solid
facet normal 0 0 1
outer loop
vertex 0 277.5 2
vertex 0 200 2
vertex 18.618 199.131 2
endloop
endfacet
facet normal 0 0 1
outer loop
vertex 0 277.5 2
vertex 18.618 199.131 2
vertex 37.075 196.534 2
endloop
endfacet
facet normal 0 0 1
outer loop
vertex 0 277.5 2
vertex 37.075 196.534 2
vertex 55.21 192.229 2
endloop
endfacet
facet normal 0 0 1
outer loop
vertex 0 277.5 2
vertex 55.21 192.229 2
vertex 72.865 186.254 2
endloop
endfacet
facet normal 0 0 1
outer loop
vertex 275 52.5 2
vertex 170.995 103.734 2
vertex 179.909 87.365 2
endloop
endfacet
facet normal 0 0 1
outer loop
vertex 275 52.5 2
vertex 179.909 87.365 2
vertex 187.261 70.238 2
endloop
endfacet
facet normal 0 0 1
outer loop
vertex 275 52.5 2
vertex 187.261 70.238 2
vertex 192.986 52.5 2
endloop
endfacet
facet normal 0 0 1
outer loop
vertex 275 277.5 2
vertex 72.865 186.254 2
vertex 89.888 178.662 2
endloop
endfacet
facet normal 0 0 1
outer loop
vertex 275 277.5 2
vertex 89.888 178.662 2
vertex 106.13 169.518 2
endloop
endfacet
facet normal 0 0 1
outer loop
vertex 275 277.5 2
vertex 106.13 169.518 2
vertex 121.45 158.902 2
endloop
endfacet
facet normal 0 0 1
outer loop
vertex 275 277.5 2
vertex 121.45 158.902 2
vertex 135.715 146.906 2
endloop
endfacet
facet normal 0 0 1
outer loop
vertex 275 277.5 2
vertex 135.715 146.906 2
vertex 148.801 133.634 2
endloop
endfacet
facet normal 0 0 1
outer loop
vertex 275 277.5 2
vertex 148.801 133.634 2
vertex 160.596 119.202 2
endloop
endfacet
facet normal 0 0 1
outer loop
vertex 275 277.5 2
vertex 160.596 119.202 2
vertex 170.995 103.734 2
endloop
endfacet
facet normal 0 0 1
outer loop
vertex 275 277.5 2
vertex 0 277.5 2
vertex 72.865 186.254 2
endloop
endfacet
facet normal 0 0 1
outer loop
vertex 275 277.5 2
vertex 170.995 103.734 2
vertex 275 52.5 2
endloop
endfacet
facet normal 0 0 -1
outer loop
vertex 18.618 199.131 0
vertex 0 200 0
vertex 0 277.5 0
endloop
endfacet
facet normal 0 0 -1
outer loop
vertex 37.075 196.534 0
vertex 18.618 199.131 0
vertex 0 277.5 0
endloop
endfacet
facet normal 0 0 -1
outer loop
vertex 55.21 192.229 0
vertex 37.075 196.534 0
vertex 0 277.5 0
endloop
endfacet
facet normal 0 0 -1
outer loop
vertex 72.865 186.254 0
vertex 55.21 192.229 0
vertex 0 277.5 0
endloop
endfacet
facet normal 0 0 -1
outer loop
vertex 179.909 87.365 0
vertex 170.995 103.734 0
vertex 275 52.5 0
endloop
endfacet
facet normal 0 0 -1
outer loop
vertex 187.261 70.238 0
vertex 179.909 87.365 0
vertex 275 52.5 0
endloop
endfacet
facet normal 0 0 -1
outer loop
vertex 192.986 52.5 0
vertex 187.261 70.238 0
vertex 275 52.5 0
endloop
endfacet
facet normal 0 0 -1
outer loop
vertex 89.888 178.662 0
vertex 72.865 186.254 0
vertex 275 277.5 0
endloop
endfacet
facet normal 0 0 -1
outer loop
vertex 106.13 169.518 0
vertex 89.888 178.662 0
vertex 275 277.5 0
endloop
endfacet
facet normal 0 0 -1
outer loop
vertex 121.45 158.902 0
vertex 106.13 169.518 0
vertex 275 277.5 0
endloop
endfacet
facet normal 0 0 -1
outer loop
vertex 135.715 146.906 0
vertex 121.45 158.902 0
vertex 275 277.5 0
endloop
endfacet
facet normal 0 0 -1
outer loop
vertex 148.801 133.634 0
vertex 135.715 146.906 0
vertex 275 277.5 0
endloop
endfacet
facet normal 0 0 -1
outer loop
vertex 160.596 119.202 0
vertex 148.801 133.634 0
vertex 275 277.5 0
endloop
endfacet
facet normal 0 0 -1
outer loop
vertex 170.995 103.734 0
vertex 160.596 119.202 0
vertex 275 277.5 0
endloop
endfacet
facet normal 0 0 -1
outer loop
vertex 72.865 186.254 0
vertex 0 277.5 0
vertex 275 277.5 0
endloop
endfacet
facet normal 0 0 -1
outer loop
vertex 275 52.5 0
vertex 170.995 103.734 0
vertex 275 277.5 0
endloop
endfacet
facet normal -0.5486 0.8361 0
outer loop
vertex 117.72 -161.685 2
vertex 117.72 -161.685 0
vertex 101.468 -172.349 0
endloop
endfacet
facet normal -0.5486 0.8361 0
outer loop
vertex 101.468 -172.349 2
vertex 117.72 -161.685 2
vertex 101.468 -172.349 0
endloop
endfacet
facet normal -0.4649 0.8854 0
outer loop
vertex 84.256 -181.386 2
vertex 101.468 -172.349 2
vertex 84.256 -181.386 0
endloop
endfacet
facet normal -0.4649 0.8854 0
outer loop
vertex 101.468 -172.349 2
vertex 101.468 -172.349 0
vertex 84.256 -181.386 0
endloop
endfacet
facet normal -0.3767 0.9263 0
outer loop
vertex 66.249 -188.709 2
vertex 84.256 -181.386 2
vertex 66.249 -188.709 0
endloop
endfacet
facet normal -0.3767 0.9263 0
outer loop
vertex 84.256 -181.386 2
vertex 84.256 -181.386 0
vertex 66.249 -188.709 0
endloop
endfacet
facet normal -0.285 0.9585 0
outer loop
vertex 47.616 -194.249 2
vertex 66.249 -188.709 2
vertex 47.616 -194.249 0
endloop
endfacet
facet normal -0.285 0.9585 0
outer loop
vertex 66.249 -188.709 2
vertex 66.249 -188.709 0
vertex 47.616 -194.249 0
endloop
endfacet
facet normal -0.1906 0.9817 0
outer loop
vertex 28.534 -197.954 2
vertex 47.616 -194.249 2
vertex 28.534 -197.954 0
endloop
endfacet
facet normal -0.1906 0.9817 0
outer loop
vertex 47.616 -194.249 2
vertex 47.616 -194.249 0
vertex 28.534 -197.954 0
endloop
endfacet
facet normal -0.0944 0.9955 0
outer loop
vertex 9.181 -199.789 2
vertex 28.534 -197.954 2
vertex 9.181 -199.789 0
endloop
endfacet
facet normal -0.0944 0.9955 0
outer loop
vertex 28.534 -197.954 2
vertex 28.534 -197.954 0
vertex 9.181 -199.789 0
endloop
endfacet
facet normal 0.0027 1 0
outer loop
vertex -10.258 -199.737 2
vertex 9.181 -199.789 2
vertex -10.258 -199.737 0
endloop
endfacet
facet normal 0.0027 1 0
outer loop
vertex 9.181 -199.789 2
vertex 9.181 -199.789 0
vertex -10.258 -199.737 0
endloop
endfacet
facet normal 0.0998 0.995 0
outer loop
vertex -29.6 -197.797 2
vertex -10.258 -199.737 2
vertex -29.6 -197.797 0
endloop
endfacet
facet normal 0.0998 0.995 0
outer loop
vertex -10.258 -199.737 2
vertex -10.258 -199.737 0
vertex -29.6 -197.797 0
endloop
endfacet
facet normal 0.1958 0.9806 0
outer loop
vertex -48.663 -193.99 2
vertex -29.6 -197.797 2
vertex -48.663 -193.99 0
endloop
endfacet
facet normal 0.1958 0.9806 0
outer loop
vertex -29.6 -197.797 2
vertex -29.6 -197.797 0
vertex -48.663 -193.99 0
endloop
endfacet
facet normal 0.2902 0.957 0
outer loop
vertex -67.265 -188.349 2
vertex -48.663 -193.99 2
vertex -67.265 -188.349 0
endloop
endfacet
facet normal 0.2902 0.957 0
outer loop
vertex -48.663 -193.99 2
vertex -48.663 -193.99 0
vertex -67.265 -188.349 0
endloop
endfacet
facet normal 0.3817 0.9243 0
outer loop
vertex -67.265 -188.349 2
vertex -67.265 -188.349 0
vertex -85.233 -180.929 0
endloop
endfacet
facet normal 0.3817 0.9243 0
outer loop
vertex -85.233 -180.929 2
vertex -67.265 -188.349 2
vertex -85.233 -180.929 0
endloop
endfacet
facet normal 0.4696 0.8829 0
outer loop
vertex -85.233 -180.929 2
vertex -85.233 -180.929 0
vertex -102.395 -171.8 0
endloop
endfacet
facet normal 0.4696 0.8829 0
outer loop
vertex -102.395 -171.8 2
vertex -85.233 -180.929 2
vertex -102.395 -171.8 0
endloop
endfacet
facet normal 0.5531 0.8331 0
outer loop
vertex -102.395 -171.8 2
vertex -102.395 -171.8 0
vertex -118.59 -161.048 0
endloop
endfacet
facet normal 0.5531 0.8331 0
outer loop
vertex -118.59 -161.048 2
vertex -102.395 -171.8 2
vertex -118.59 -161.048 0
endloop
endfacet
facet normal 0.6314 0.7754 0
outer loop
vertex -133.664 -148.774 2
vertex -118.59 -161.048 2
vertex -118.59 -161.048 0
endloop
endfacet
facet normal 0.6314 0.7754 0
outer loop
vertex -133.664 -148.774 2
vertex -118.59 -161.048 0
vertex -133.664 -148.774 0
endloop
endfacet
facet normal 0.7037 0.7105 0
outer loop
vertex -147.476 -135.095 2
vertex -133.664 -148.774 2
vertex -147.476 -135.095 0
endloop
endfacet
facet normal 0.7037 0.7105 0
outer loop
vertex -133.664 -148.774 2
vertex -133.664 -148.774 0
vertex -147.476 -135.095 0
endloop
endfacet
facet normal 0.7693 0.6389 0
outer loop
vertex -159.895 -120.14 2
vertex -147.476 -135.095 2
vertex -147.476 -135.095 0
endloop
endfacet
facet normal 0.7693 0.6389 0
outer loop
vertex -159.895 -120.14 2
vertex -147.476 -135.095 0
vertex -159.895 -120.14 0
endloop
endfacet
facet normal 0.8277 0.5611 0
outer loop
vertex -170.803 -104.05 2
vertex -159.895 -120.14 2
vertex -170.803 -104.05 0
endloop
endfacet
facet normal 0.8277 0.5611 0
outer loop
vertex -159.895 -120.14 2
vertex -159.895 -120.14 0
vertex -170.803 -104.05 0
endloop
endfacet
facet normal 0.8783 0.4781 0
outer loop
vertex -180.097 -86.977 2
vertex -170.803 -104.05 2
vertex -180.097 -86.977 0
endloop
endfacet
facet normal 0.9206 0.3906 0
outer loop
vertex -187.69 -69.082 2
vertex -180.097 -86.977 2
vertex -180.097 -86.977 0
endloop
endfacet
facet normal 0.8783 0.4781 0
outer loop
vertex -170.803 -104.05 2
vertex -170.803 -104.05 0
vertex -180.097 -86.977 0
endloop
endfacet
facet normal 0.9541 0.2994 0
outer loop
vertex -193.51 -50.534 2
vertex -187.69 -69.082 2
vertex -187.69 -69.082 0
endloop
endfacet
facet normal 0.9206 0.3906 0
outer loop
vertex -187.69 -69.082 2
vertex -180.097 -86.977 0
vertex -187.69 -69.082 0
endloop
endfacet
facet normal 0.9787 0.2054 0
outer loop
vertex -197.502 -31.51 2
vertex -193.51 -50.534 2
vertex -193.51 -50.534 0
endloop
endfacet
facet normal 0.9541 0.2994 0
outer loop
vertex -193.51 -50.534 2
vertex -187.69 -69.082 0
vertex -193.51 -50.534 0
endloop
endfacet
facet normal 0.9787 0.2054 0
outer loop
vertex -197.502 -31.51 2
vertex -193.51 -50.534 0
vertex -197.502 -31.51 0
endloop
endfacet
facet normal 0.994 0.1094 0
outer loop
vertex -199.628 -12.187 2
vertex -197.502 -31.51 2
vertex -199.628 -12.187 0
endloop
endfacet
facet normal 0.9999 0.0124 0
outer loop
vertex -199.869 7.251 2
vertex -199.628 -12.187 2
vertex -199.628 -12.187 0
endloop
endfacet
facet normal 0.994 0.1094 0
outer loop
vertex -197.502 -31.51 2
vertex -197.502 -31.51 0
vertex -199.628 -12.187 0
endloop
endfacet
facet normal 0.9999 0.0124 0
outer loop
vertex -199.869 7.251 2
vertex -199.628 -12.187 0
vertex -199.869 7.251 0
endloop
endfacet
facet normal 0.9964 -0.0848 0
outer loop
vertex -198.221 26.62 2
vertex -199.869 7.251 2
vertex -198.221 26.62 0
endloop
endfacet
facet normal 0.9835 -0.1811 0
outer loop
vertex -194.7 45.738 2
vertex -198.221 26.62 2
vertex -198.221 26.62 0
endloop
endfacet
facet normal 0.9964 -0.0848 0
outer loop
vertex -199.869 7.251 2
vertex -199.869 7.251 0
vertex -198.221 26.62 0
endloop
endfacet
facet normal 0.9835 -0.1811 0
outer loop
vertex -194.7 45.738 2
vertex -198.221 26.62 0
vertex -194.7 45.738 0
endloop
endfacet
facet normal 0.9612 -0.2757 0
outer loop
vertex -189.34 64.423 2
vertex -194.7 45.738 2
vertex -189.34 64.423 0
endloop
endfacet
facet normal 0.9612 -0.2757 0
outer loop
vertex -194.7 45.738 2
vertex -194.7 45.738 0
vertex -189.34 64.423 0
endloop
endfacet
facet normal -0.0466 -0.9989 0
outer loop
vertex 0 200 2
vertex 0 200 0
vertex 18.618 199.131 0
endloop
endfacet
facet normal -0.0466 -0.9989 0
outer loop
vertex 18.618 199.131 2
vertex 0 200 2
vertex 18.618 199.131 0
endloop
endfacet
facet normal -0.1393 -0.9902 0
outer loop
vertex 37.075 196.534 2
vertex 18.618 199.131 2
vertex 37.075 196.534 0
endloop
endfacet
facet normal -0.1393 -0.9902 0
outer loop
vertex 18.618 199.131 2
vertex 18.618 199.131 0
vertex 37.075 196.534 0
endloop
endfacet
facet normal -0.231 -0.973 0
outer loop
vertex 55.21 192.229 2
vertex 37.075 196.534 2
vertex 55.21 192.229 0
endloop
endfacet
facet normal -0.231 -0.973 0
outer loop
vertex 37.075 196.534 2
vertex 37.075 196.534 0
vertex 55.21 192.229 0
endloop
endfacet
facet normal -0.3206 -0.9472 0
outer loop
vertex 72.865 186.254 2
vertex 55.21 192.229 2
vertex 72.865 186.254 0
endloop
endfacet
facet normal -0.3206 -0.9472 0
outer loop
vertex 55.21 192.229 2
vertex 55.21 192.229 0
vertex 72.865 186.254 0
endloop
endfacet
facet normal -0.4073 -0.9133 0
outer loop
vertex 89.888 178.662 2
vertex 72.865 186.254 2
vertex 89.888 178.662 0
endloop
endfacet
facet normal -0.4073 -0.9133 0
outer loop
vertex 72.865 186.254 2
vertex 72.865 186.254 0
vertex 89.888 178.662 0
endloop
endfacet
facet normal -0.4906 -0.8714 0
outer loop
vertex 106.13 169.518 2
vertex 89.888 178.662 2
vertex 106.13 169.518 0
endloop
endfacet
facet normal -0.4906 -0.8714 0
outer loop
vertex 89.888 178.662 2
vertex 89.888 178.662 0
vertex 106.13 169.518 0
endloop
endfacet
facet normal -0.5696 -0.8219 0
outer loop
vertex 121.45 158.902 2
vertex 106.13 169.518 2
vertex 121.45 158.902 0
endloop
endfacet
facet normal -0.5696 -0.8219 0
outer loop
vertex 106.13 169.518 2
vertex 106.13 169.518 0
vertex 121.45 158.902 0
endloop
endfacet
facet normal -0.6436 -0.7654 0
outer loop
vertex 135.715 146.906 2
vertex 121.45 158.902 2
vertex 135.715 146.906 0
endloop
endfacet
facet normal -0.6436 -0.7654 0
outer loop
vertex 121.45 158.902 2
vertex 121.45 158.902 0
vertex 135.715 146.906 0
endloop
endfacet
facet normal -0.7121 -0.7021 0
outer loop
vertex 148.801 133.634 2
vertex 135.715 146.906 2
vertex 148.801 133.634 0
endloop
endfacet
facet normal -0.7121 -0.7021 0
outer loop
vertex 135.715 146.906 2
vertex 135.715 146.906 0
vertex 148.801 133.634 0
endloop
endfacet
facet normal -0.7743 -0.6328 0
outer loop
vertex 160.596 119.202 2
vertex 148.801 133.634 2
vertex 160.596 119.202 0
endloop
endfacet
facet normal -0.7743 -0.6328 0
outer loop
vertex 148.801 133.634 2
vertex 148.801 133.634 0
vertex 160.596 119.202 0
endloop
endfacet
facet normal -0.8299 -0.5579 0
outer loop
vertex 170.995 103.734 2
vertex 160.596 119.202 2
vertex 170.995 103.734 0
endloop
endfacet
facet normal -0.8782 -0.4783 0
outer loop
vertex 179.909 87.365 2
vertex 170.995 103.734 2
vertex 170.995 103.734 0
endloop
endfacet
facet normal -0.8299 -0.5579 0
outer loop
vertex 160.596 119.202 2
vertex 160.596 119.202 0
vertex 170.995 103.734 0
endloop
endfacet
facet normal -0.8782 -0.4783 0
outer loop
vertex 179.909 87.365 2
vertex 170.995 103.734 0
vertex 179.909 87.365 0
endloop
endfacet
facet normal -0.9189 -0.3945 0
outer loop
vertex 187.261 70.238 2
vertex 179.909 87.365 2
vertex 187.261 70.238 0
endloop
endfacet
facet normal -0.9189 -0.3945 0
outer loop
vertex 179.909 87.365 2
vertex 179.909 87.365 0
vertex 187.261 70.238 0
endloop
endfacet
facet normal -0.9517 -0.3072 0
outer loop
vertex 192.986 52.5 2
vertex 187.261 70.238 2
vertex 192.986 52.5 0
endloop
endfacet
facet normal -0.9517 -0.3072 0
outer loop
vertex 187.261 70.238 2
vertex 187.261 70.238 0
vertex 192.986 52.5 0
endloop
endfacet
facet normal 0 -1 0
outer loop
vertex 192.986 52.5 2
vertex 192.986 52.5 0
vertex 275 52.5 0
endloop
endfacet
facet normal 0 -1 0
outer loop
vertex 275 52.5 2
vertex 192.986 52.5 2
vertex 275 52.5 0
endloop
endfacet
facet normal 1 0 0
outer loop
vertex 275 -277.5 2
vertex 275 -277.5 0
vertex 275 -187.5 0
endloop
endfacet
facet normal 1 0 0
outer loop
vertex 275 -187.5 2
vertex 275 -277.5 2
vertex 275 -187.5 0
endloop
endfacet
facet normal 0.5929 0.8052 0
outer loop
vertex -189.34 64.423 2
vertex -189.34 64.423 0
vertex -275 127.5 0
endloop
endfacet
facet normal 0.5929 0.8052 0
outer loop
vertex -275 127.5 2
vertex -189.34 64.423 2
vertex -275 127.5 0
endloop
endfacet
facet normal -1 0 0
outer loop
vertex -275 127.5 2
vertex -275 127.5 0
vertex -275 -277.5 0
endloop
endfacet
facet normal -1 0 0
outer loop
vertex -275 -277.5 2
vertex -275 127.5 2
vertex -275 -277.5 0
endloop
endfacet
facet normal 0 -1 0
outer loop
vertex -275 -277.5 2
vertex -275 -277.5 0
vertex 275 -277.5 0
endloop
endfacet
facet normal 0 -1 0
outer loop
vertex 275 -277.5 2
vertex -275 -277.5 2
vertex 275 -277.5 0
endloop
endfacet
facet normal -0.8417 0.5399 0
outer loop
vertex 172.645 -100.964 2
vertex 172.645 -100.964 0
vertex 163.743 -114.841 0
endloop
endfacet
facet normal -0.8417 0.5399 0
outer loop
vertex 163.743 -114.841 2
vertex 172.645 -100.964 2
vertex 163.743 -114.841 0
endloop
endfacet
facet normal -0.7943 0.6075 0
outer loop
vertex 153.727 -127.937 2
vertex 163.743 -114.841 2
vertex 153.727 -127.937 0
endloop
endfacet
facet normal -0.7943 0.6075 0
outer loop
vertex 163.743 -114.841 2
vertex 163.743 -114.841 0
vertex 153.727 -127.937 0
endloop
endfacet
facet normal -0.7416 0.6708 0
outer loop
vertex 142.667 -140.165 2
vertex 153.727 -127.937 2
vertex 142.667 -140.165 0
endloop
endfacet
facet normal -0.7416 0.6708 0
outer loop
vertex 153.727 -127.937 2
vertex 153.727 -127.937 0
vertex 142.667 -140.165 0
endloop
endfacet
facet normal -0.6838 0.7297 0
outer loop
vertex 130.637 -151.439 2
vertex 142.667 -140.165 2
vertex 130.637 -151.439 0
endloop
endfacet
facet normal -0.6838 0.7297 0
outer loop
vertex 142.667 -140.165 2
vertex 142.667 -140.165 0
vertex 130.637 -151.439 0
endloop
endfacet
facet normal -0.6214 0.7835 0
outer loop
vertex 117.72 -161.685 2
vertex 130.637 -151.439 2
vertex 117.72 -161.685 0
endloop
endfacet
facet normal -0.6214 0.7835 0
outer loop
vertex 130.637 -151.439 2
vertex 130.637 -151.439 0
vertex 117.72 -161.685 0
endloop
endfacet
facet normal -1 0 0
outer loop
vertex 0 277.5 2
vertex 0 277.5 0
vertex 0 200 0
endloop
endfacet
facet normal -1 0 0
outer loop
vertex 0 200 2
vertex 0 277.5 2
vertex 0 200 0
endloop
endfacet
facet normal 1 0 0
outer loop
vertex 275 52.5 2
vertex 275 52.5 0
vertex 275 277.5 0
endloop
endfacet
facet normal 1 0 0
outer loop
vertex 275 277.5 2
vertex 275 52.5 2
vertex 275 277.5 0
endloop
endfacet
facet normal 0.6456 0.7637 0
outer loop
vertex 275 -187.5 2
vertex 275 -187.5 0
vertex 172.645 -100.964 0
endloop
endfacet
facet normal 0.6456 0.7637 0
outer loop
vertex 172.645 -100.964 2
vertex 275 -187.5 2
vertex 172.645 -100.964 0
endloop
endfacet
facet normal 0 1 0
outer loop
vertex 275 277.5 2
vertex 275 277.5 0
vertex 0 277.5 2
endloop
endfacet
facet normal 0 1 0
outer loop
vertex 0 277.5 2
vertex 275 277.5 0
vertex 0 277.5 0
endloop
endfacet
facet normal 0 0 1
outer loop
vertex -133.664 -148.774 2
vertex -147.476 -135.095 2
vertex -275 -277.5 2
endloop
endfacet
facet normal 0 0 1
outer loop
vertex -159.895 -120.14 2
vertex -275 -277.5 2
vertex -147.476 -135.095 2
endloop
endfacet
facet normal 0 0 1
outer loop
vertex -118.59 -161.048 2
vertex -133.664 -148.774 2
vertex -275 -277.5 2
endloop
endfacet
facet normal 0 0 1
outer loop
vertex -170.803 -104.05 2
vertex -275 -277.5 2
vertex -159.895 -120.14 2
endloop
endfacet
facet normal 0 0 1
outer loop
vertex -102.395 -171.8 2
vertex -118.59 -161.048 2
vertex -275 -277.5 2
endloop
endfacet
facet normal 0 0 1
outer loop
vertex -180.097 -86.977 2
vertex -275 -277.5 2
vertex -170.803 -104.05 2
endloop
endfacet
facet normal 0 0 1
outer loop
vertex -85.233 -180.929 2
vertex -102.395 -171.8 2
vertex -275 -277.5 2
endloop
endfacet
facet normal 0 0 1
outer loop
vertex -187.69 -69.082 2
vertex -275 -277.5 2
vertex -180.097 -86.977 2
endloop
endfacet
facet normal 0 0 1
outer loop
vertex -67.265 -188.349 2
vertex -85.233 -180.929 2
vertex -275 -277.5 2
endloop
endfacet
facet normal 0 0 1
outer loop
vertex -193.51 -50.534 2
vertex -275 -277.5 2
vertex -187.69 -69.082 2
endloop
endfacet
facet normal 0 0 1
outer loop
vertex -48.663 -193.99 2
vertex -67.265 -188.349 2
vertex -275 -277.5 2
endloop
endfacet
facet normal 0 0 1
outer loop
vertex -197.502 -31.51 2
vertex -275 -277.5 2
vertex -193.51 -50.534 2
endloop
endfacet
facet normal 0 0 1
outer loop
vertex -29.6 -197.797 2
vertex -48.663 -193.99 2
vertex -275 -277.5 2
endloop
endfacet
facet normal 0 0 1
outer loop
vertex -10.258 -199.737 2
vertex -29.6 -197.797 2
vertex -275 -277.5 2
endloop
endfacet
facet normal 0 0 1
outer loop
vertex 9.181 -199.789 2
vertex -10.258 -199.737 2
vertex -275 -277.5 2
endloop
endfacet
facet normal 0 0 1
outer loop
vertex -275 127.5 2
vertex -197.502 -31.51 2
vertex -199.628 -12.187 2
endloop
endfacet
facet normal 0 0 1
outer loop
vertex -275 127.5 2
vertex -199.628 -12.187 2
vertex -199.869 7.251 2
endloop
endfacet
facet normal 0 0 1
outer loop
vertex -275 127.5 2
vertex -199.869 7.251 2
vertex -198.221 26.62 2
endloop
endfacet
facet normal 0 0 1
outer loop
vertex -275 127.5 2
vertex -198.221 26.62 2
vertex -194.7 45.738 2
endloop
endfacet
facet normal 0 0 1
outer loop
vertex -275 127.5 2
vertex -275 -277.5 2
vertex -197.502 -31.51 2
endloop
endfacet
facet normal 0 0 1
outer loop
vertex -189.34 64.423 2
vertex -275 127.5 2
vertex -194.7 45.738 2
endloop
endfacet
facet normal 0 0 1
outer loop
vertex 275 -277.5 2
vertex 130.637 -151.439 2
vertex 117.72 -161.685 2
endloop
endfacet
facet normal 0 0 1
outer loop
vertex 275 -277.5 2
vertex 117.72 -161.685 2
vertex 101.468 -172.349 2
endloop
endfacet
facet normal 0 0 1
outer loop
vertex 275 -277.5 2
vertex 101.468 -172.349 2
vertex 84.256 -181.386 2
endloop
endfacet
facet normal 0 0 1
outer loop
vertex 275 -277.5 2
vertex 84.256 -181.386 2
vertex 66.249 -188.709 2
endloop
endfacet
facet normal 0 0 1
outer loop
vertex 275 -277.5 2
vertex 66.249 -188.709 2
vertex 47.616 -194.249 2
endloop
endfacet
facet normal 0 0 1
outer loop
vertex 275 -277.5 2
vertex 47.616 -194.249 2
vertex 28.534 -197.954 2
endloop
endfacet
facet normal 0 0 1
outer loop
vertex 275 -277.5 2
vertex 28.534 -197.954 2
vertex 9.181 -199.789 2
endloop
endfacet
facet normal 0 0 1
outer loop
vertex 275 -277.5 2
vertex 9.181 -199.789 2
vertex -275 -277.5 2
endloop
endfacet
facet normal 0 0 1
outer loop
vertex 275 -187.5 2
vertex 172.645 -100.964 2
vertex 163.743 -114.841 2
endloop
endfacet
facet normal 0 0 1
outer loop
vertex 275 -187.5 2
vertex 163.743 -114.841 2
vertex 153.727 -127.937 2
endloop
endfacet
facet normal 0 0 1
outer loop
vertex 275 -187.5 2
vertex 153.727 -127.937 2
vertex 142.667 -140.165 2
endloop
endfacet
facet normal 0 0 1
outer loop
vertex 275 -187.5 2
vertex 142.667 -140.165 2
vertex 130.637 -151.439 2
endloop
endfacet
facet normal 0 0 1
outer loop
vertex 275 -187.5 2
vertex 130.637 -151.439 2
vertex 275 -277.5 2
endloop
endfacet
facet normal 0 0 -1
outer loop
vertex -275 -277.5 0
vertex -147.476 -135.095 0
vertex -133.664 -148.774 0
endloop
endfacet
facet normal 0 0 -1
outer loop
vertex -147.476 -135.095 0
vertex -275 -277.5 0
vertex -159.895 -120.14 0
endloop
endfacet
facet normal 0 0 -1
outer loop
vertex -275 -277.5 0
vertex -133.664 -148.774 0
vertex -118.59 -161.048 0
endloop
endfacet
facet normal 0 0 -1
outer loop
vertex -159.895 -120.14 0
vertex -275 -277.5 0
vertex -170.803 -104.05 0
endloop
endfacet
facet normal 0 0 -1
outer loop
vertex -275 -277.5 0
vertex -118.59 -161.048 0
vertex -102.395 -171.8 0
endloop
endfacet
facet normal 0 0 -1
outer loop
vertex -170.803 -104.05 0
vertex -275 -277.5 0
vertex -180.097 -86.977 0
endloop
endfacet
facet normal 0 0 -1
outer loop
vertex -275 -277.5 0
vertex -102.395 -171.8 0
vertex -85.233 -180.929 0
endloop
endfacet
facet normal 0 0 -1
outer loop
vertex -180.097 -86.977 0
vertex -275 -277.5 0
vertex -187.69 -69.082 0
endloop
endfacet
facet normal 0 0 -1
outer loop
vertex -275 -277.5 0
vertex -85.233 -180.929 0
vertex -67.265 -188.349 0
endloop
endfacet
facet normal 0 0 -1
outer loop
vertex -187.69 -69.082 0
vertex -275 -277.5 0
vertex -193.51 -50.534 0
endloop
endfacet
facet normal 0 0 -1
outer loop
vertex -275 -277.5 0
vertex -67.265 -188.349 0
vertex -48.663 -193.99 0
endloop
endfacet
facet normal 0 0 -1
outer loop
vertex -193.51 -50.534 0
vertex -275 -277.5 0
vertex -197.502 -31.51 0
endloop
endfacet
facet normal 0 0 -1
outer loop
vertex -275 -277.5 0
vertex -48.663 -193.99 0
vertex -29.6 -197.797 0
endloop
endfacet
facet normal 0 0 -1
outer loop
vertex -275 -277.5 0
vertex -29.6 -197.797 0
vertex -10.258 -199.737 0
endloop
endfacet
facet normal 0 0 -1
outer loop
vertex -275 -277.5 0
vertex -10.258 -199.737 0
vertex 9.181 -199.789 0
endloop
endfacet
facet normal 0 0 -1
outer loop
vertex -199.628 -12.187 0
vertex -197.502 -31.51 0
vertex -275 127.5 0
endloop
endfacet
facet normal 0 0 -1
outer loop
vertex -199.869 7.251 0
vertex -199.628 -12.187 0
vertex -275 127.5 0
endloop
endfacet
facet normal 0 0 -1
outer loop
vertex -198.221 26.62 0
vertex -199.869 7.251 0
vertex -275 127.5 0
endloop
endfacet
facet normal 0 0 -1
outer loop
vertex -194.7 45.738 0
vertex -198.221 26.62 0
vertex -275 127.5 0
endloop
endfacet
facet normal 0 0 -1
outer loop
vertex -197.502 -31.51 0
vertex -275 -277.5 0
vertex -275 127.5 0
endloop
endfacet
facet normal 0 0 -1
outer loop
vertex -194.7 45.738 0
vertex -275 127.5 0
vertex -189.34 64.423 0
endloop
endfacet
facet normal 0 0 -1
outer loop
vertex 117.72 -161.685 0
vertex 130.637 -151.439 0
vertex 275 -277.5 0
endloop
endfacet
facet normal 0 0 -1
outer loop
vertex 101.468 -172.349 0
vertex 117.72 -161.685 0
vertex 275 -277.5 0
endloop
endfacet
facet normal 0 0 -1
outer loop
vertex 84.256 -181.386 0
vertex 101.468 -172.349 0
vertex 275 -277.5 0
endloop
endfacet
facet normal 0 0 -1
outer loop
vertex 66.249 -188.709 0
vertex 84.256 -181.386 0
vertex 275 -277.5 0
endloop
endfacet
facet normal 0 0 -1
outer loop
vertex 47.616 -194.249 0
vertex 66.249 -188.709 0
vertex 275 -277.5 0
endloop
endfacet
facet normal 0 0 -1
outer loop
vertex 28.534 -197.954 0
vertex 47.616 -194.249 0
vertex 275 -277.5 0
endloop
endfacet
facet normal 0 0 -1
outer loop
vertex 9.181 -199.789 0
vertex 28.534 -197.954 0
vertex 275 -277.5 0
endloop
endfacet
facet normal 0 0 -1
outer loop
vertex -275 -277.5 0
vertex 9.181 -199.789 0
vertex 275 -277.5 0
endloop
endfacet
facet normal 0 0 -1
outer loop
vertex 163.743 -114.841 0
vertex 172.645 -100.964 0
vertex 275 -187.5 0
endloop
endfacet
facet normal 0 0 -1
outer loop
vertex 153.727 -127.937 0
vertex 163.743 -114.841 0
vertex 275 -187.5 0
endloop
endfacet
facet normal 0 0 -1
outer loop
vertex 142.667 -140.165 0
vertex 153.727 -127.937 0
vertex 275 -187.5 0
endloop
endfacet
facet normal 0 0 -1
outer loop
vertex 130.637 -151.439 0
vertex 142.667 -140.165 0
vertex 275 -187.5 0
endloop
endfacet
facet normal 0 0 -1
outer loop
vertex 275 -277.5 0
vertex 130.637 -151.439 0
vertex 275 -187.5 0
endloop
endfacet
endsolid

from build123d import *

# Parameters (mm, degrees)
F1_DEPTH = 2


with BuildPart() as f1:
    # F0 (on Top) → F1 (new body)
    with BuildSketch(Plane.XY):
        with BuildLine():
            Line((-275, 127.5), (-275, -277.5))
            Line((-275, -277.5), (275, -277.5))
            Line((275, -277.5), (275, -187.5))
            Line((275, -187.5), (172.645147, -100.963624))
            ThreePointArc((172.645147, -100.963624), (148.323163, -134.164971), (117.720107, -161.684806))
            ThreePointArc((117.720107, -161.684806), (-118.58986, -161.047959), (-189.340063, 64.423137))
            Line((-189.340063, 64.423137), (-275, 127.5))
        make_face()
        with BuildLine():
            Line((192.986398, 52.5), (275, 52.5))
            Line((275, 52.5), (275, 277.5))
            Line((275, 277.5), (0, 277.5))
            Line((0, 277.5), (0, 200))
            ThreePointArc((0, 200), (121.449578, 158.902486), (192.986398, 52.5))
        make_face()
    extrude(amount=F1_DEPTH)


solid = f1.part
